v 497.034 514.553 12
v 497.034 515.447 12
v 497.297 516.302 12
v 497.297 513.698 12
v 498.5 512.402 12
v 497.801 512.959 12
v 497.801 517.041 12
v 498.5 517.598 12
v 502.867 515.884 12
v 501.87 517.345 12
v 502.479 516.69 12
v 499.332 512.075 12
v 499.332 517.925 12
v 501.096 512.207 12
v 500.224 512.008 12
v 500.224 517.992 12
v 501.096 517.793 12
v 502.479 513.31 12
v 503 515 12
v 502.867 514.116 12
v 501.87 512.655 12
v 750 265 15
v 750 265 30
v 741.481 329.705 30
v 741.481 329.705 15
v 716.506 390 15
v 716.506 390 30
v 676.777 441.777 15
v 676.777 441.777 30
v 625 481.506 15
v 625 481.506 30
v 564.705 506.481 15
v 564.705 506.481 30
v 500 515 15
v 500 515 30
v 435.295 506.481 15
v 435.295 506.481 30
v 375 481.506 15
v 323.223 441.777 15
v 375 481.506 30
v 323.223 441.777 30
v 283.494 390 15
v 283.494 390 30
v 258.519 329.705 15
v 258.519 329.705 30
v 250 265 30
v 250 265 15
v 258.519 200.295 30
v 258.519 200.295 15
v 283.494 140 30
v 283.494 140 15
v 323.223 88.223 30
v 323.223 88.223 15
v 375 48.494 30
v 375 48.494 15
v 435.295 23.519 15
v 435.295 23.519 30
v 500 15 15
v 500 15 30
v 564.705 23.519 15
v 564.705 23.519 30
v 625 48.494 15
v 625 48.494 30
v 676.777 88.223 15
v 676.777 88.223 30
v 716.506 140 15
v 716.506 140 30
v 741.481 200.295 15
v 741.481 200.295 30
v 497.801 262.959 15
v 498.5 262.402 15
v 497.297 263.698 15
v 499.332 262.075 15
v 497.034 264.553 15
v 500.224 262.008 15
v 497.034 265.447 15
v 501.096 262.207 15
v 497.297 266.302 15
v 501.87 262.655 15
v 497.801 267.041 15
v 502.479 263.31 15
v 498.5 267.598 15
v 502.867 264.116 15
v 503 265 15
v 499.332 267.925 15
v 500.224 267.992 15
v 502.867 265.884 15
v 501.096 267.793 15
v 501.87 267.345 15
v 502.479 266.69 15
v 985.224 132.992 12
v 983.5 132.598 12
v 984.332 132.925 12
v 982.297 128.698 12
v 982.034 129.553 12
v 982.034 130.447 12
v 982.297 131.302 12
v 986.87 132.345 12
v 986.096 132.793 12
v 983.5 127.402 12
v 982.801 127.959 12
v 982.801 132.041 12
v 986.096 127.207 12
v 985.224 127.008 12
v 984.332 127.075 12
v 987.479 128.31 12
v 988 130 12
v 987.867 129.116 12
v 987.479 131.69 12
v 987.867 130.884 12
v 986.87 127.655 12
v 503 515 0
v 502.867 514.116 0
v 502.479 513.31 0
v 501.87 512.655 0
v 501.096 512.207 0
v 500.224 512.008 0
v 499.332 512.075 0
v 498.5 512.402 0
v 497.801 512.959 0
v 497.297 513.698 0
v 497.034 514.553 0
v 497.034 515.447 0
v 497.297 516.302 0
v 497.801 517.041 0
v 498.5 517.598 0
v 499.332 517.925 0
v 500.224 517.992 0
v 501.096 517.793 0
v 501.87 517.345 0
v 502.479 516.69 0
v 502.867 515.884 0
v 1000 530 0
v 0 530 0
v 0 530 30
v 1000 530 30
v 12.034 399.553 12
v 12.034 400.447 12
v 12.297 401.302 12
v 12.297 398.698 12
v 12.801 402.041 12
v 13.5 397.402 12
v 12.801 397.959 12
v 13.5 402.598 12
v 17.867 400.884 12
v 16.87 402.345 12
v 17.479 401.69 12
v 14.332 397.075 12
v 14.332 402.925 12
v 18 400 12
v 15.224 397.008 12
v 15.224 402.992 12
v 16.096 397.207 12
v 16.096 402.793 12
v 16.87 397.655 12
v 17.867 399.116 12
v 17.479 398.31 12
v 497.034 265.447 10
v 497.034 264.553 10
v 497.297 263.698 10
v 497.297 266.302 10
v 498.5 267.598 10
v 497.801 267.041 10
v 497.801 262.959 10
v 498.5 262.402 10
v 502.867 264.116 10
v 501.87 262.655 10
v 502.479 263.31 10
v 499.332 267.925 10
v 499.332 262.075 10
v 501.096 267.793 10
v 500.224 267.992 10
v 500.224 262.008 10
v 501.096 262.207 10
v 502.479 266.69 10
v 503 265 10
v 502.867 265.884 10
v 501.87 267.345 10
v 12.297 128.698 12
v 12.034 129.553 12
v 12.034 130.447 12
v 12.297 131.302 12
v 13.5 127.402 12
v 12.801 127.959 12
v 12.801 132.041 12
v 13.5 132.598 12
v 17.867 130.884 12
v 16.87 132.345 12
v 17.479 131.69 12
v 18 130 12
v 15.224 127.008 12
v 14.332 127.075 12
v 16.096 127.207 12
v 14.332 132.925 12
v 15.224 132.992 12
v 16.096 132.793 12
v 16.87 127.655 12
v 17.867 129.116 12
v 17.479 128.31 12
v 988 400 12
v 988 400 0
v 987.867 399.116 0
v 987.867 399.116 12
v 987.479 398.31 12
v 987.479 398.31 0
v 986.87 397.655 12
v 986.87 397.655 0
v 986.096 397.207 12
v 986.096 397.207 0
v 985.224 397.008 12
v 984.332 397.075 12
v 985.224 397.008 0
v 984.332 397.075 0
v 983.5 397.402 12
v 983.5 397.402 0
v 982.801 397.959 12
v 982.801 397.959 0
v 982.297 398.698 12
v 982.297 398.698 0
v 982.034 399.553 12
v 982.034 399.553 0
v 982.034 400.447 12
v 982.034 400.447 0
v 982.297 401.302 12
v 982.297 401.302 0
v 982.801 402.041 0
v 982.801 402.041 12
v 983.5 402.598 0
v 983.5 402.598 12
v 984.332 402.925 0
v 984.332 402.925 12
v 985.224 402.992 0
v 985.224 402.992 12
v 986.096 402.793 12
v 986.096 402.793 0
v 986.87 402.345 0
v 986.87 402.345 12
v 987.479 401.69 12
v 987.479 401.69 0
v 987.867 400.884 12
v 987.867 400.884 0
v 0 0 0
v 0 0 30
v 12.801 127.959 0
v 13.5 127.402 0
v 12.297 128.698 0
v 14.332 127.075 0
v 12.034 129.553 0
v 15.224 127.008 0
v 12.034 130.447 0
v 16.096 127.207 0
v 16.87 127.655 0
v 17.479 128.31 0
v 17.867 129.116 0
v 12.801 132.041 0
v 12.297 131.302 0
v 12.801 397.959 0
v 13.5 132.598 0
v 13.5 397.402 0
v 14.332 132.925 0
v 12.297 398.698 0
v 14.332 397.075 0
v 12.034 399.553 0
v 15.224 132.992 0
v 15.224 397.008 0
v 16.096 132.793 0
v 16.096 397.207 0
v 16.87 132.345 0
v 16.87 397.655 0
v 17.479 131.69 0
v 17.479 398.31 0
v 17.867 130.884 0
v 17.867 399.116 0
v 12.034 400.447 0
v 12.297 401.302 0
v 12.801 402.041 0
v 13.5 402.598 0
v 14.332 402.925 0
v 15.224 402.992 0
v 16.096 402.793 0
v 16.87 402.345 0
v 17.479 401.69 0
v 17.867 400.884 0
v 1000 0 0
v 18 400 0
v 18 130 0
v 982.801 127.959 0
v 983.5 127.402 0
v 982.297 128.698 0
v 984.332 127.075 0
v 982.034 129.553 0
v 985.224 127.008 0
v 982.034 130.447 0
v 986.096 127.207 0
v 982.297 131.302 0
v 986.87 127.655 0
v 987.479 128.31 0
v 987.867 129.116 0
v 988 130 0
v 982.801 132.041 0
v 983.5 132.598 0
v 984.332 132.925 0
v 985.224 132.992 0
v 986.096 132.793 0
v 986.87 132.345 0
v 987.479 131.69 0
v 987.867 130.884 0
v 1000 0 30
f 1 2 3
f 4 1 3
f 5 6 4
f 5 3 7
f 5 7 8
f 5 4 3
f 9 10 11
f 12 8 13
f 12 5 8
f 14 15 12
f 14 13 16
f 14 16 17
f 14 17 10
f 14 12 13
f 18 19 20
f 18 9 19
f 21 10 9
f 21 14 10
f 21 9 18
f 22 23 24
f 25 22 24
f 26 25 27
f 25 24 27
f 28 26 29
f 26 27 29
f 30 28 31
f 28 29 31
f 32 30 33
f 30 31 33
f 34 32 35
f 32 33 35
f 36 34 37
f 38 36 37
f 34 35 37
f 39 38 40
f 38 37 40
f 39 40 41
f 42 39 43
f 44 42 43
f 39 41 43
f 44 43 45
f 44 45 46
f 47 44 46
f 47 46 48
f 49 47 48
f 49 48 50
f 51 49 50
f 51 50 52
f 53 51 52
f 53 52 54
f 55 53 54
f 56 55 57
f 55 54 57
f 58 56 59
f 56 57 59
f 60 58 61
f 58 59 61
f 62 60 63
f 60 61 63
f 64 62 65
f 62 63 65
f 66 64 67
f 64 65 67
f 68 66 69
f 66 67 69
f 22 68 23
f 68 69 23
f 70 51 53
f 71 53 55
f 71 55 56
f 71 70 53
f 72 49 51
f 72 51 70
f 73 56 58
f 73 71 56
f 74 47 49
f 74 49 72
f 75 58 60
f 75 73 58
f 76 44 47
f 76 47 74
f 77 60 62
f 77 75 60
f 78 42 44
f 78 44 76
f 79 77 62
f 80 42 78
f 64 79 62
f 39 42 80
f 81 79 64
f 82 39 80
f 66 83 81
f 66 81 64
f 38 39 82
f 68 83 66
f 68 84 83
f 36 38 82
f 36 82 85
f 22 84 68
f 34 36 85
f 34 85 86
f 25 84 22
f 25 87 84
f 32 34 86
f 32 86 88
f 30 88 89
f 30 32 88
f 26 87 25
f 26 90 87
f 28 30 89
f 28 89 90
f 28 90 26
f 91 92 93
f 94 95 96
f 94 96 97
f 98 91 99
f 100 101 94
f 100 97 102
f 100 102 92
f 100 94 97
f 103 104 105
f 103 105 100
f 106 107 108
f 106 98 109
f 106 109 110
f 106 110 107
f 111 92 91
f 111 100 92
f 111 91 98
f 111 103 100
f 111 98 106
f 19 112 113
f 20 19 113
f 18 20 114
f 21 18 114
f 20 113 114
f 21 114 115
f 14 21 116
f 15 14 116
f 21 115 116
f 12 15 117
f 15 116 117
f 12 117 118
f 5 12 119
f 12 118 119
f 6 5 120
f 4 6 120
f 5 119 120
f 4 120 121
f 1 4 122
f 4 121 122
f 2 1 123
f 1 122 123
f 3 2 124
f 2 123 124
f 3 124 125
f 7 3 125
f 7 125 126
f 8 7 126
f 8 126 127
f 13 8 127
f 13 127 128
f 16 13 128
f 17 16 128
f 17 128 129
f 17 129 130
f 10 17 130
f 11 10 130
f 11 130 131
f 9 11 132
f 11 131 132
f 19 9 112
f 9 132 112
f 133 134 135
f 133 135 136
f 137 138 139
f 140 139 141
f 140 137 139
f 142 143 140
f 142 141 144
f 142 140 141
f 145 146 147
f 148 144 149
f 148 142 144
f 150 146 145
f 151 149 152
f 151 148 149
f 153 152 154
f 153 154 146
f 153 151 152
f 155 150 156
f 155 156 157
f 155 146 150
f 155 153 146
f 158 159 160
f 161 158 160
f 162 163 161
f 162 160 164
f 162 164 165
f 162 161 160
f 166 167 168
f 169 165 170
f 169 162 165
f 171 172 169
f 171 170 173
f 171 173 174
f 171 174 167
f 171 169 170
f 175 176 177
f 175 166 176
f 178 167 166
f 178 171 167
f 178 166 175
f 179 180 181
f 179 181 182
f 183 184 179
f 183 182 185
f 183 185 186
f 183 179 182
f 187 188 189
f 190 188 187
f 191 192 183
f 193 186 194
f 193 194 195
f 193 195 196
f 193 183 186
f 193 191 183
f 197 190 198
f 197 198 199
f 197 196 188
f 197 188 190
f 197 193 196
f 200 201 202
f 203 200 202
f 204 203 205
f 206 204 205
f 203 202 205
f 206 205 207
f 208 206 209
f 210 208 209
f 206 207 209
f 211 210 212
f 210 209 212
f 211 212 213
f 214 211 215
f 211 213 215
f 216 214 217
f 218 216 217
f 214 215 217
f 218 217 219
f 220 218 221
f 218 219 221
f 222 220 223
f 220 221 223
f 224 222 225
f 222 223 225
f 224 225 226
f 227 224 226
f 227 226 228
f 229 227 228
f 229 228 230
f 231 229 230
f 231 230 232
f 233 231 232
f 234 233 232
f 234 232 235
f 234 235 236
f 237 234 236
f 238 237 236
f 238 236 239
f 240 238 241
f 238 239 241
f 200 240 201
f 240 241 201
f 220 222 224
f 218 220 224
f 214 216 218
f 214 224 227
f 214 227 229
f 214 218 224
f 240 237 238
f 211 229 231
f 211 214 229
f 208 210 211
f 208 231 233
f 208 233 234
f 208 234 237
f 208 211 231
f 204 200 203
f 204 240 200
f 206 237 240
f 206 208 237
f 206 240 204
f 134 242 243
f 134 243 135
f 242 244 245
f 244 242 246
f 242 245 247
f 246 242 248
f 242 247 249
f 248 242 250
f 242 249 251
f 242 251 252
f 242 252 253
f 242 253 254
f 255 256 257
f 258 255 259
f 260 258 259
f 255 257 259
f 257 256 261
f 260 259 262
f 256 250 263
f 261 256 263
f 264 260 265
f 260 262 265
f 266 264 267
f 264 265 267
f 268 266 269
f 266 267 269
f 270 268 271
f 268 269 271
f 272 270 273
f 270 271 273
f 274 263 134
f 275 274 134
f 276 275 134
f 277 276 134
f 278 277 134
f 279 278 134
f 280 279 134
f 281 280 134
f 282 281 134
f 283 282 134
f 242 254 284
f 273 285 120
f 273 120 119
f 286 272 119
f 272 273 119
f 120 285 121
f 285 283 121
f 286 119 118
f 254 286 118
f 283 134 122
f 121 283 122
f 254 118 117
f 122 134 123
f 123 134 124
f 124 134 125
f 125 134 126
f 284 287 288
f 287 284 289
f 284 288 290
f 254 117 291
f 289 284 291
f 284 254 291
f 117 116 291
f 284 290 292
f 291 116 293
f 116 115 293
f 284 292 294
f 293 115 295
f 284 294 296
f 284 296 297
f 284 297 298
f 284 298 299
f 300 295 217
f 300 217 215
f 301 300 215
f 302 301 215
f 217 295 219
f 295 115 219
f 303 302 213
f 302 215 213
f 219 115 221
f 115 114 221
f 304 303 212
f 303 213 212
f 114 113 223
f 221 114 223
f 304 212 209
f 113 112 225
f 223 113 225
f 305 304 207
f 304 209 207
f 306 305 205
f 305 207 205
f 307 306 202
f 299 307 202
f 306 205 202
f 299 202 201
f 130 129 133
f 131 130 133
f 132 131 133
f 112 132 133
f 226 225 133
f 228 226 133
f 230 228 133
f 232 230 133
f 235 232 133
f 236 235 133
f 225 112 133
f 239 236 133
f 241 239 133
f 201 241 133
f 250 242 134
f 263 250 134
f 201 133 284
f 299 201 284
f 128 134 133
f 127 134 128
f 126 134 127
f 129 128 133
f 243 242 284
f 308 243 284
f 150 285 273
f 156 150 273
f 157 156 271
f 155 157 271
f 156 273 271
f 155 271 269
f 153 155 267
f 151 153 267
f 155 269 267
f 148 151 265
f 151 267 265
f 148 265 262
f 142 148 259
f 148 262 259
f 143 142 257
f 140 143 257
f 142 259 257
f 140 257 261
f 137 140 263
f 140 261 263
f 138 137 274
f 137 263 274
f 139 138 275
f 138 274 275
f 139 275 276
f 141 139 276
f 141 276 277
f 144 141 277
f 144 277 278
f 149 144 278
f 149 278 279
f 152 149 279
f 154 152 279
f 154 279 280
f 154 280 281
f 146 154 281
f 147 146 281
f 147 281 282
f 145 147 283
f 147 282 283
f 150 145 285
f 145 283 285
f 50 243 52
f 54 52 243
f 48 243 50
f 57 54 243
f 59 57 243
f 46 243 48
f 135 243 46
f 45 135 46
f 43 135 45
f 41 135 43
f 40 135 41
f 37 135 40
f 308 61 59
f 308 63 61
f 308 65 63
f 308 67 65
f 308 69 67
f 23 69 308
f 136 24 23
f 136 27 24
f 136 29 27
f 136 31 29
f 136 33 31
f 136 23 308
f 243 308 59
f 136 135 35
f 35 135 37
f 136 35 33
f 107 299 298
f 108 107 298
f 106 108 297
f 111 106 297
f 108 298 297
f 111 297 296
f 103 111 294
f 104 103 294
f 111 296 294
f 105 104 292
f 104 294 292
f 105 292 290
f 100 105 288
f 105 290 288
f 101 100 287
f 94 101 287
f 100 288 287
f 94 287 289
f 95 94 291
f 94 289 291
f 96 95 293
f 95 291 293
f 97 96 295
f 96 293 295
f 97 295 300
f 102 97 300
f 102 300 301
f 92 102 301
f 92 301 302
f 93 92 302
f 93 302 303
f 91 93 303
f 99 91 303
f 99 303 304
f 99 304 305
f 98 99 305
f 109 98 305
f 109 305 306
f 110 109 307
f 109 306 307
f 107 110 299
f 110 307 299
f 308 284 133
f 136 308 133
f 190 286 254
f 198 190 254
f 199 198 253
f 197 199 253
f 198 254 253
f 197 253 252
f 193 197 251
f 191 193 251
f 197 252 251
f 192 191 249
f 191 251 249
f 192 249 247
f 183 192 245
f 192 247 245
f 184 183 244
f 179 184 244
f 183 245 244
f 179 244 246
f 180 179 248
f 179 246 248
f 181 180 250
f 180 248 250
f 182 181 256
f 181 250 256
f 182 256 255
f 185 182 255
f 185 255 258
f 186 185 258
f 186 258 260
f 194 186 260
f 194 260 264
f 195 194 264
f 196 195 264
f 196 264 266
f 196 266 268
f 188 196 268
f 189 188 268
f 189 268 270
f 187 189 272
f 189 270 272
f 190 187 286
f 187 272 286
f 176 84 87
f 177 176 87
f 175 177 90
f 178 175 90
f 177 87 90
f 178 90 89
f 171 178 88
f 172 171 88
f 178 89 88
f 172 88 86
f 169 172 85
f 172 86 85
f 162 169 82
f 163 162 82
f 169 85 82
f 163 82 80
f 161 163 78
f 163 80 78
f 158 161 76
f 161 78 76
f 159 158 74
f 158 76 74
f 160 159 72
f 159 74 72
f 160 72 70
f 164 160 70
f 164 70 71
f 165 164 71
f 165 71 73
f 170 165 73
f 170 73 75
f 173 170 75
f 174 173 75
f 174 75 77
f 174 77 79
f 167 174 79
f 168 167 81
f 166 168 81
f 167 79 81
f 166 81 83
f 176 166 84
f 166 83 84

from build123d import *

# Parameters (mm, degrees)
F0_W      = 1000
F0_H      = 530
F1_DEPTH  = 30
F2_R      = 3
F3_DEPTH  = 12
F4_R      = 3
F5_DEPTH  = 12
F7_R      = 3
F8_DEPTH  = 12
F9_R      = 3
F10_DEPTH = 12
F6_R      = 250
F11_DEPTH = 15
F12_R     = 3
F13_DEPTH = 5
F14_R     = 3
F15_DEPTH = 12


with BuildPart() as f1:
    # F0 (on Top) → F1 (new body)
    with BuildSketch(Plane.XY):
        with Locations((500, 265)):
            Rectangle(F0_W, F0_H)
    extrude(amount=F1_DEPTH)

    # F2 (on face) → F3 (cut)
    with BuildSketch(Plane(origin=(0, 0, 0), x_dir=(1, 0, 0), z_dir=(0, 0, -1))):
        with Locations((985, -130)):
            Circle(F2_R)
    extrude(amount=-F3_DEPTH, mode=Mode.SUBTRACT)

    # F4 (on face) → F5 (cut)
    with BuildSketch(Plane(origin=(0, 0, 0), x_dir=(1, 0, 0), z_dir=(0, 0, -1))):
        with Locations((15, -130)):
            Circle(F4_R)
    extrude(amount=-F5_DEPTH, mode=Mode.SUBTRACT)

    # F7 (on face) → F8 (cut)
    with BuildSketch(Plane(origin=(0, 0, 0), x_dir=(1, 0, 0), z_dir=(0, 0, -1))):
        with Locations((985, -400)):
            Circle(F7_R)
    extrude(amount=-F8_DEPTH, mode=Mode.SUBTRACT)

    # F9 (on face) → F10 (cut)
    with BuildSketch(Plane(origin=(0, 0, 0), x_dir=(1, 0, 0), z_dir=(0, 0, -1))):
        with Locations((15, -400)):
            Circle(F9_R)
    extrude(amount=-F10_DEPTH, mode=Mode.SUBTRACT)

    # F6 (on face) → F11 (cut)
    with BuildSketch(Plane.XY.offset(30)):
        with Locations((500, 265)):
            Circle(F6_R)
    extrude(amount=-F11_DEPTH, mode=Mode.SUBTRACT)

    # F12 (on face) → F13 (cut)
    with BuildSketch(Plane.XY.offset(15)):
        with Locations((500, 265)):
            Circle(F12_R)
    extrude(amount=-F13_DEPTH, mode=Mode.SUBTRACT)

    # F14 (on face) → F15 (cut)
    with BuildSketch(Plane(origin=(0, 0, 0), x_dir=(1, 0, 0), z_dir=(0, 0, -1))):
        with Locations((500, -515)):
            Circle(F14_R)
    extrude(amount=-F15_DEPTH, mode=Mode.SUBTRACT)


solid = f1.part
